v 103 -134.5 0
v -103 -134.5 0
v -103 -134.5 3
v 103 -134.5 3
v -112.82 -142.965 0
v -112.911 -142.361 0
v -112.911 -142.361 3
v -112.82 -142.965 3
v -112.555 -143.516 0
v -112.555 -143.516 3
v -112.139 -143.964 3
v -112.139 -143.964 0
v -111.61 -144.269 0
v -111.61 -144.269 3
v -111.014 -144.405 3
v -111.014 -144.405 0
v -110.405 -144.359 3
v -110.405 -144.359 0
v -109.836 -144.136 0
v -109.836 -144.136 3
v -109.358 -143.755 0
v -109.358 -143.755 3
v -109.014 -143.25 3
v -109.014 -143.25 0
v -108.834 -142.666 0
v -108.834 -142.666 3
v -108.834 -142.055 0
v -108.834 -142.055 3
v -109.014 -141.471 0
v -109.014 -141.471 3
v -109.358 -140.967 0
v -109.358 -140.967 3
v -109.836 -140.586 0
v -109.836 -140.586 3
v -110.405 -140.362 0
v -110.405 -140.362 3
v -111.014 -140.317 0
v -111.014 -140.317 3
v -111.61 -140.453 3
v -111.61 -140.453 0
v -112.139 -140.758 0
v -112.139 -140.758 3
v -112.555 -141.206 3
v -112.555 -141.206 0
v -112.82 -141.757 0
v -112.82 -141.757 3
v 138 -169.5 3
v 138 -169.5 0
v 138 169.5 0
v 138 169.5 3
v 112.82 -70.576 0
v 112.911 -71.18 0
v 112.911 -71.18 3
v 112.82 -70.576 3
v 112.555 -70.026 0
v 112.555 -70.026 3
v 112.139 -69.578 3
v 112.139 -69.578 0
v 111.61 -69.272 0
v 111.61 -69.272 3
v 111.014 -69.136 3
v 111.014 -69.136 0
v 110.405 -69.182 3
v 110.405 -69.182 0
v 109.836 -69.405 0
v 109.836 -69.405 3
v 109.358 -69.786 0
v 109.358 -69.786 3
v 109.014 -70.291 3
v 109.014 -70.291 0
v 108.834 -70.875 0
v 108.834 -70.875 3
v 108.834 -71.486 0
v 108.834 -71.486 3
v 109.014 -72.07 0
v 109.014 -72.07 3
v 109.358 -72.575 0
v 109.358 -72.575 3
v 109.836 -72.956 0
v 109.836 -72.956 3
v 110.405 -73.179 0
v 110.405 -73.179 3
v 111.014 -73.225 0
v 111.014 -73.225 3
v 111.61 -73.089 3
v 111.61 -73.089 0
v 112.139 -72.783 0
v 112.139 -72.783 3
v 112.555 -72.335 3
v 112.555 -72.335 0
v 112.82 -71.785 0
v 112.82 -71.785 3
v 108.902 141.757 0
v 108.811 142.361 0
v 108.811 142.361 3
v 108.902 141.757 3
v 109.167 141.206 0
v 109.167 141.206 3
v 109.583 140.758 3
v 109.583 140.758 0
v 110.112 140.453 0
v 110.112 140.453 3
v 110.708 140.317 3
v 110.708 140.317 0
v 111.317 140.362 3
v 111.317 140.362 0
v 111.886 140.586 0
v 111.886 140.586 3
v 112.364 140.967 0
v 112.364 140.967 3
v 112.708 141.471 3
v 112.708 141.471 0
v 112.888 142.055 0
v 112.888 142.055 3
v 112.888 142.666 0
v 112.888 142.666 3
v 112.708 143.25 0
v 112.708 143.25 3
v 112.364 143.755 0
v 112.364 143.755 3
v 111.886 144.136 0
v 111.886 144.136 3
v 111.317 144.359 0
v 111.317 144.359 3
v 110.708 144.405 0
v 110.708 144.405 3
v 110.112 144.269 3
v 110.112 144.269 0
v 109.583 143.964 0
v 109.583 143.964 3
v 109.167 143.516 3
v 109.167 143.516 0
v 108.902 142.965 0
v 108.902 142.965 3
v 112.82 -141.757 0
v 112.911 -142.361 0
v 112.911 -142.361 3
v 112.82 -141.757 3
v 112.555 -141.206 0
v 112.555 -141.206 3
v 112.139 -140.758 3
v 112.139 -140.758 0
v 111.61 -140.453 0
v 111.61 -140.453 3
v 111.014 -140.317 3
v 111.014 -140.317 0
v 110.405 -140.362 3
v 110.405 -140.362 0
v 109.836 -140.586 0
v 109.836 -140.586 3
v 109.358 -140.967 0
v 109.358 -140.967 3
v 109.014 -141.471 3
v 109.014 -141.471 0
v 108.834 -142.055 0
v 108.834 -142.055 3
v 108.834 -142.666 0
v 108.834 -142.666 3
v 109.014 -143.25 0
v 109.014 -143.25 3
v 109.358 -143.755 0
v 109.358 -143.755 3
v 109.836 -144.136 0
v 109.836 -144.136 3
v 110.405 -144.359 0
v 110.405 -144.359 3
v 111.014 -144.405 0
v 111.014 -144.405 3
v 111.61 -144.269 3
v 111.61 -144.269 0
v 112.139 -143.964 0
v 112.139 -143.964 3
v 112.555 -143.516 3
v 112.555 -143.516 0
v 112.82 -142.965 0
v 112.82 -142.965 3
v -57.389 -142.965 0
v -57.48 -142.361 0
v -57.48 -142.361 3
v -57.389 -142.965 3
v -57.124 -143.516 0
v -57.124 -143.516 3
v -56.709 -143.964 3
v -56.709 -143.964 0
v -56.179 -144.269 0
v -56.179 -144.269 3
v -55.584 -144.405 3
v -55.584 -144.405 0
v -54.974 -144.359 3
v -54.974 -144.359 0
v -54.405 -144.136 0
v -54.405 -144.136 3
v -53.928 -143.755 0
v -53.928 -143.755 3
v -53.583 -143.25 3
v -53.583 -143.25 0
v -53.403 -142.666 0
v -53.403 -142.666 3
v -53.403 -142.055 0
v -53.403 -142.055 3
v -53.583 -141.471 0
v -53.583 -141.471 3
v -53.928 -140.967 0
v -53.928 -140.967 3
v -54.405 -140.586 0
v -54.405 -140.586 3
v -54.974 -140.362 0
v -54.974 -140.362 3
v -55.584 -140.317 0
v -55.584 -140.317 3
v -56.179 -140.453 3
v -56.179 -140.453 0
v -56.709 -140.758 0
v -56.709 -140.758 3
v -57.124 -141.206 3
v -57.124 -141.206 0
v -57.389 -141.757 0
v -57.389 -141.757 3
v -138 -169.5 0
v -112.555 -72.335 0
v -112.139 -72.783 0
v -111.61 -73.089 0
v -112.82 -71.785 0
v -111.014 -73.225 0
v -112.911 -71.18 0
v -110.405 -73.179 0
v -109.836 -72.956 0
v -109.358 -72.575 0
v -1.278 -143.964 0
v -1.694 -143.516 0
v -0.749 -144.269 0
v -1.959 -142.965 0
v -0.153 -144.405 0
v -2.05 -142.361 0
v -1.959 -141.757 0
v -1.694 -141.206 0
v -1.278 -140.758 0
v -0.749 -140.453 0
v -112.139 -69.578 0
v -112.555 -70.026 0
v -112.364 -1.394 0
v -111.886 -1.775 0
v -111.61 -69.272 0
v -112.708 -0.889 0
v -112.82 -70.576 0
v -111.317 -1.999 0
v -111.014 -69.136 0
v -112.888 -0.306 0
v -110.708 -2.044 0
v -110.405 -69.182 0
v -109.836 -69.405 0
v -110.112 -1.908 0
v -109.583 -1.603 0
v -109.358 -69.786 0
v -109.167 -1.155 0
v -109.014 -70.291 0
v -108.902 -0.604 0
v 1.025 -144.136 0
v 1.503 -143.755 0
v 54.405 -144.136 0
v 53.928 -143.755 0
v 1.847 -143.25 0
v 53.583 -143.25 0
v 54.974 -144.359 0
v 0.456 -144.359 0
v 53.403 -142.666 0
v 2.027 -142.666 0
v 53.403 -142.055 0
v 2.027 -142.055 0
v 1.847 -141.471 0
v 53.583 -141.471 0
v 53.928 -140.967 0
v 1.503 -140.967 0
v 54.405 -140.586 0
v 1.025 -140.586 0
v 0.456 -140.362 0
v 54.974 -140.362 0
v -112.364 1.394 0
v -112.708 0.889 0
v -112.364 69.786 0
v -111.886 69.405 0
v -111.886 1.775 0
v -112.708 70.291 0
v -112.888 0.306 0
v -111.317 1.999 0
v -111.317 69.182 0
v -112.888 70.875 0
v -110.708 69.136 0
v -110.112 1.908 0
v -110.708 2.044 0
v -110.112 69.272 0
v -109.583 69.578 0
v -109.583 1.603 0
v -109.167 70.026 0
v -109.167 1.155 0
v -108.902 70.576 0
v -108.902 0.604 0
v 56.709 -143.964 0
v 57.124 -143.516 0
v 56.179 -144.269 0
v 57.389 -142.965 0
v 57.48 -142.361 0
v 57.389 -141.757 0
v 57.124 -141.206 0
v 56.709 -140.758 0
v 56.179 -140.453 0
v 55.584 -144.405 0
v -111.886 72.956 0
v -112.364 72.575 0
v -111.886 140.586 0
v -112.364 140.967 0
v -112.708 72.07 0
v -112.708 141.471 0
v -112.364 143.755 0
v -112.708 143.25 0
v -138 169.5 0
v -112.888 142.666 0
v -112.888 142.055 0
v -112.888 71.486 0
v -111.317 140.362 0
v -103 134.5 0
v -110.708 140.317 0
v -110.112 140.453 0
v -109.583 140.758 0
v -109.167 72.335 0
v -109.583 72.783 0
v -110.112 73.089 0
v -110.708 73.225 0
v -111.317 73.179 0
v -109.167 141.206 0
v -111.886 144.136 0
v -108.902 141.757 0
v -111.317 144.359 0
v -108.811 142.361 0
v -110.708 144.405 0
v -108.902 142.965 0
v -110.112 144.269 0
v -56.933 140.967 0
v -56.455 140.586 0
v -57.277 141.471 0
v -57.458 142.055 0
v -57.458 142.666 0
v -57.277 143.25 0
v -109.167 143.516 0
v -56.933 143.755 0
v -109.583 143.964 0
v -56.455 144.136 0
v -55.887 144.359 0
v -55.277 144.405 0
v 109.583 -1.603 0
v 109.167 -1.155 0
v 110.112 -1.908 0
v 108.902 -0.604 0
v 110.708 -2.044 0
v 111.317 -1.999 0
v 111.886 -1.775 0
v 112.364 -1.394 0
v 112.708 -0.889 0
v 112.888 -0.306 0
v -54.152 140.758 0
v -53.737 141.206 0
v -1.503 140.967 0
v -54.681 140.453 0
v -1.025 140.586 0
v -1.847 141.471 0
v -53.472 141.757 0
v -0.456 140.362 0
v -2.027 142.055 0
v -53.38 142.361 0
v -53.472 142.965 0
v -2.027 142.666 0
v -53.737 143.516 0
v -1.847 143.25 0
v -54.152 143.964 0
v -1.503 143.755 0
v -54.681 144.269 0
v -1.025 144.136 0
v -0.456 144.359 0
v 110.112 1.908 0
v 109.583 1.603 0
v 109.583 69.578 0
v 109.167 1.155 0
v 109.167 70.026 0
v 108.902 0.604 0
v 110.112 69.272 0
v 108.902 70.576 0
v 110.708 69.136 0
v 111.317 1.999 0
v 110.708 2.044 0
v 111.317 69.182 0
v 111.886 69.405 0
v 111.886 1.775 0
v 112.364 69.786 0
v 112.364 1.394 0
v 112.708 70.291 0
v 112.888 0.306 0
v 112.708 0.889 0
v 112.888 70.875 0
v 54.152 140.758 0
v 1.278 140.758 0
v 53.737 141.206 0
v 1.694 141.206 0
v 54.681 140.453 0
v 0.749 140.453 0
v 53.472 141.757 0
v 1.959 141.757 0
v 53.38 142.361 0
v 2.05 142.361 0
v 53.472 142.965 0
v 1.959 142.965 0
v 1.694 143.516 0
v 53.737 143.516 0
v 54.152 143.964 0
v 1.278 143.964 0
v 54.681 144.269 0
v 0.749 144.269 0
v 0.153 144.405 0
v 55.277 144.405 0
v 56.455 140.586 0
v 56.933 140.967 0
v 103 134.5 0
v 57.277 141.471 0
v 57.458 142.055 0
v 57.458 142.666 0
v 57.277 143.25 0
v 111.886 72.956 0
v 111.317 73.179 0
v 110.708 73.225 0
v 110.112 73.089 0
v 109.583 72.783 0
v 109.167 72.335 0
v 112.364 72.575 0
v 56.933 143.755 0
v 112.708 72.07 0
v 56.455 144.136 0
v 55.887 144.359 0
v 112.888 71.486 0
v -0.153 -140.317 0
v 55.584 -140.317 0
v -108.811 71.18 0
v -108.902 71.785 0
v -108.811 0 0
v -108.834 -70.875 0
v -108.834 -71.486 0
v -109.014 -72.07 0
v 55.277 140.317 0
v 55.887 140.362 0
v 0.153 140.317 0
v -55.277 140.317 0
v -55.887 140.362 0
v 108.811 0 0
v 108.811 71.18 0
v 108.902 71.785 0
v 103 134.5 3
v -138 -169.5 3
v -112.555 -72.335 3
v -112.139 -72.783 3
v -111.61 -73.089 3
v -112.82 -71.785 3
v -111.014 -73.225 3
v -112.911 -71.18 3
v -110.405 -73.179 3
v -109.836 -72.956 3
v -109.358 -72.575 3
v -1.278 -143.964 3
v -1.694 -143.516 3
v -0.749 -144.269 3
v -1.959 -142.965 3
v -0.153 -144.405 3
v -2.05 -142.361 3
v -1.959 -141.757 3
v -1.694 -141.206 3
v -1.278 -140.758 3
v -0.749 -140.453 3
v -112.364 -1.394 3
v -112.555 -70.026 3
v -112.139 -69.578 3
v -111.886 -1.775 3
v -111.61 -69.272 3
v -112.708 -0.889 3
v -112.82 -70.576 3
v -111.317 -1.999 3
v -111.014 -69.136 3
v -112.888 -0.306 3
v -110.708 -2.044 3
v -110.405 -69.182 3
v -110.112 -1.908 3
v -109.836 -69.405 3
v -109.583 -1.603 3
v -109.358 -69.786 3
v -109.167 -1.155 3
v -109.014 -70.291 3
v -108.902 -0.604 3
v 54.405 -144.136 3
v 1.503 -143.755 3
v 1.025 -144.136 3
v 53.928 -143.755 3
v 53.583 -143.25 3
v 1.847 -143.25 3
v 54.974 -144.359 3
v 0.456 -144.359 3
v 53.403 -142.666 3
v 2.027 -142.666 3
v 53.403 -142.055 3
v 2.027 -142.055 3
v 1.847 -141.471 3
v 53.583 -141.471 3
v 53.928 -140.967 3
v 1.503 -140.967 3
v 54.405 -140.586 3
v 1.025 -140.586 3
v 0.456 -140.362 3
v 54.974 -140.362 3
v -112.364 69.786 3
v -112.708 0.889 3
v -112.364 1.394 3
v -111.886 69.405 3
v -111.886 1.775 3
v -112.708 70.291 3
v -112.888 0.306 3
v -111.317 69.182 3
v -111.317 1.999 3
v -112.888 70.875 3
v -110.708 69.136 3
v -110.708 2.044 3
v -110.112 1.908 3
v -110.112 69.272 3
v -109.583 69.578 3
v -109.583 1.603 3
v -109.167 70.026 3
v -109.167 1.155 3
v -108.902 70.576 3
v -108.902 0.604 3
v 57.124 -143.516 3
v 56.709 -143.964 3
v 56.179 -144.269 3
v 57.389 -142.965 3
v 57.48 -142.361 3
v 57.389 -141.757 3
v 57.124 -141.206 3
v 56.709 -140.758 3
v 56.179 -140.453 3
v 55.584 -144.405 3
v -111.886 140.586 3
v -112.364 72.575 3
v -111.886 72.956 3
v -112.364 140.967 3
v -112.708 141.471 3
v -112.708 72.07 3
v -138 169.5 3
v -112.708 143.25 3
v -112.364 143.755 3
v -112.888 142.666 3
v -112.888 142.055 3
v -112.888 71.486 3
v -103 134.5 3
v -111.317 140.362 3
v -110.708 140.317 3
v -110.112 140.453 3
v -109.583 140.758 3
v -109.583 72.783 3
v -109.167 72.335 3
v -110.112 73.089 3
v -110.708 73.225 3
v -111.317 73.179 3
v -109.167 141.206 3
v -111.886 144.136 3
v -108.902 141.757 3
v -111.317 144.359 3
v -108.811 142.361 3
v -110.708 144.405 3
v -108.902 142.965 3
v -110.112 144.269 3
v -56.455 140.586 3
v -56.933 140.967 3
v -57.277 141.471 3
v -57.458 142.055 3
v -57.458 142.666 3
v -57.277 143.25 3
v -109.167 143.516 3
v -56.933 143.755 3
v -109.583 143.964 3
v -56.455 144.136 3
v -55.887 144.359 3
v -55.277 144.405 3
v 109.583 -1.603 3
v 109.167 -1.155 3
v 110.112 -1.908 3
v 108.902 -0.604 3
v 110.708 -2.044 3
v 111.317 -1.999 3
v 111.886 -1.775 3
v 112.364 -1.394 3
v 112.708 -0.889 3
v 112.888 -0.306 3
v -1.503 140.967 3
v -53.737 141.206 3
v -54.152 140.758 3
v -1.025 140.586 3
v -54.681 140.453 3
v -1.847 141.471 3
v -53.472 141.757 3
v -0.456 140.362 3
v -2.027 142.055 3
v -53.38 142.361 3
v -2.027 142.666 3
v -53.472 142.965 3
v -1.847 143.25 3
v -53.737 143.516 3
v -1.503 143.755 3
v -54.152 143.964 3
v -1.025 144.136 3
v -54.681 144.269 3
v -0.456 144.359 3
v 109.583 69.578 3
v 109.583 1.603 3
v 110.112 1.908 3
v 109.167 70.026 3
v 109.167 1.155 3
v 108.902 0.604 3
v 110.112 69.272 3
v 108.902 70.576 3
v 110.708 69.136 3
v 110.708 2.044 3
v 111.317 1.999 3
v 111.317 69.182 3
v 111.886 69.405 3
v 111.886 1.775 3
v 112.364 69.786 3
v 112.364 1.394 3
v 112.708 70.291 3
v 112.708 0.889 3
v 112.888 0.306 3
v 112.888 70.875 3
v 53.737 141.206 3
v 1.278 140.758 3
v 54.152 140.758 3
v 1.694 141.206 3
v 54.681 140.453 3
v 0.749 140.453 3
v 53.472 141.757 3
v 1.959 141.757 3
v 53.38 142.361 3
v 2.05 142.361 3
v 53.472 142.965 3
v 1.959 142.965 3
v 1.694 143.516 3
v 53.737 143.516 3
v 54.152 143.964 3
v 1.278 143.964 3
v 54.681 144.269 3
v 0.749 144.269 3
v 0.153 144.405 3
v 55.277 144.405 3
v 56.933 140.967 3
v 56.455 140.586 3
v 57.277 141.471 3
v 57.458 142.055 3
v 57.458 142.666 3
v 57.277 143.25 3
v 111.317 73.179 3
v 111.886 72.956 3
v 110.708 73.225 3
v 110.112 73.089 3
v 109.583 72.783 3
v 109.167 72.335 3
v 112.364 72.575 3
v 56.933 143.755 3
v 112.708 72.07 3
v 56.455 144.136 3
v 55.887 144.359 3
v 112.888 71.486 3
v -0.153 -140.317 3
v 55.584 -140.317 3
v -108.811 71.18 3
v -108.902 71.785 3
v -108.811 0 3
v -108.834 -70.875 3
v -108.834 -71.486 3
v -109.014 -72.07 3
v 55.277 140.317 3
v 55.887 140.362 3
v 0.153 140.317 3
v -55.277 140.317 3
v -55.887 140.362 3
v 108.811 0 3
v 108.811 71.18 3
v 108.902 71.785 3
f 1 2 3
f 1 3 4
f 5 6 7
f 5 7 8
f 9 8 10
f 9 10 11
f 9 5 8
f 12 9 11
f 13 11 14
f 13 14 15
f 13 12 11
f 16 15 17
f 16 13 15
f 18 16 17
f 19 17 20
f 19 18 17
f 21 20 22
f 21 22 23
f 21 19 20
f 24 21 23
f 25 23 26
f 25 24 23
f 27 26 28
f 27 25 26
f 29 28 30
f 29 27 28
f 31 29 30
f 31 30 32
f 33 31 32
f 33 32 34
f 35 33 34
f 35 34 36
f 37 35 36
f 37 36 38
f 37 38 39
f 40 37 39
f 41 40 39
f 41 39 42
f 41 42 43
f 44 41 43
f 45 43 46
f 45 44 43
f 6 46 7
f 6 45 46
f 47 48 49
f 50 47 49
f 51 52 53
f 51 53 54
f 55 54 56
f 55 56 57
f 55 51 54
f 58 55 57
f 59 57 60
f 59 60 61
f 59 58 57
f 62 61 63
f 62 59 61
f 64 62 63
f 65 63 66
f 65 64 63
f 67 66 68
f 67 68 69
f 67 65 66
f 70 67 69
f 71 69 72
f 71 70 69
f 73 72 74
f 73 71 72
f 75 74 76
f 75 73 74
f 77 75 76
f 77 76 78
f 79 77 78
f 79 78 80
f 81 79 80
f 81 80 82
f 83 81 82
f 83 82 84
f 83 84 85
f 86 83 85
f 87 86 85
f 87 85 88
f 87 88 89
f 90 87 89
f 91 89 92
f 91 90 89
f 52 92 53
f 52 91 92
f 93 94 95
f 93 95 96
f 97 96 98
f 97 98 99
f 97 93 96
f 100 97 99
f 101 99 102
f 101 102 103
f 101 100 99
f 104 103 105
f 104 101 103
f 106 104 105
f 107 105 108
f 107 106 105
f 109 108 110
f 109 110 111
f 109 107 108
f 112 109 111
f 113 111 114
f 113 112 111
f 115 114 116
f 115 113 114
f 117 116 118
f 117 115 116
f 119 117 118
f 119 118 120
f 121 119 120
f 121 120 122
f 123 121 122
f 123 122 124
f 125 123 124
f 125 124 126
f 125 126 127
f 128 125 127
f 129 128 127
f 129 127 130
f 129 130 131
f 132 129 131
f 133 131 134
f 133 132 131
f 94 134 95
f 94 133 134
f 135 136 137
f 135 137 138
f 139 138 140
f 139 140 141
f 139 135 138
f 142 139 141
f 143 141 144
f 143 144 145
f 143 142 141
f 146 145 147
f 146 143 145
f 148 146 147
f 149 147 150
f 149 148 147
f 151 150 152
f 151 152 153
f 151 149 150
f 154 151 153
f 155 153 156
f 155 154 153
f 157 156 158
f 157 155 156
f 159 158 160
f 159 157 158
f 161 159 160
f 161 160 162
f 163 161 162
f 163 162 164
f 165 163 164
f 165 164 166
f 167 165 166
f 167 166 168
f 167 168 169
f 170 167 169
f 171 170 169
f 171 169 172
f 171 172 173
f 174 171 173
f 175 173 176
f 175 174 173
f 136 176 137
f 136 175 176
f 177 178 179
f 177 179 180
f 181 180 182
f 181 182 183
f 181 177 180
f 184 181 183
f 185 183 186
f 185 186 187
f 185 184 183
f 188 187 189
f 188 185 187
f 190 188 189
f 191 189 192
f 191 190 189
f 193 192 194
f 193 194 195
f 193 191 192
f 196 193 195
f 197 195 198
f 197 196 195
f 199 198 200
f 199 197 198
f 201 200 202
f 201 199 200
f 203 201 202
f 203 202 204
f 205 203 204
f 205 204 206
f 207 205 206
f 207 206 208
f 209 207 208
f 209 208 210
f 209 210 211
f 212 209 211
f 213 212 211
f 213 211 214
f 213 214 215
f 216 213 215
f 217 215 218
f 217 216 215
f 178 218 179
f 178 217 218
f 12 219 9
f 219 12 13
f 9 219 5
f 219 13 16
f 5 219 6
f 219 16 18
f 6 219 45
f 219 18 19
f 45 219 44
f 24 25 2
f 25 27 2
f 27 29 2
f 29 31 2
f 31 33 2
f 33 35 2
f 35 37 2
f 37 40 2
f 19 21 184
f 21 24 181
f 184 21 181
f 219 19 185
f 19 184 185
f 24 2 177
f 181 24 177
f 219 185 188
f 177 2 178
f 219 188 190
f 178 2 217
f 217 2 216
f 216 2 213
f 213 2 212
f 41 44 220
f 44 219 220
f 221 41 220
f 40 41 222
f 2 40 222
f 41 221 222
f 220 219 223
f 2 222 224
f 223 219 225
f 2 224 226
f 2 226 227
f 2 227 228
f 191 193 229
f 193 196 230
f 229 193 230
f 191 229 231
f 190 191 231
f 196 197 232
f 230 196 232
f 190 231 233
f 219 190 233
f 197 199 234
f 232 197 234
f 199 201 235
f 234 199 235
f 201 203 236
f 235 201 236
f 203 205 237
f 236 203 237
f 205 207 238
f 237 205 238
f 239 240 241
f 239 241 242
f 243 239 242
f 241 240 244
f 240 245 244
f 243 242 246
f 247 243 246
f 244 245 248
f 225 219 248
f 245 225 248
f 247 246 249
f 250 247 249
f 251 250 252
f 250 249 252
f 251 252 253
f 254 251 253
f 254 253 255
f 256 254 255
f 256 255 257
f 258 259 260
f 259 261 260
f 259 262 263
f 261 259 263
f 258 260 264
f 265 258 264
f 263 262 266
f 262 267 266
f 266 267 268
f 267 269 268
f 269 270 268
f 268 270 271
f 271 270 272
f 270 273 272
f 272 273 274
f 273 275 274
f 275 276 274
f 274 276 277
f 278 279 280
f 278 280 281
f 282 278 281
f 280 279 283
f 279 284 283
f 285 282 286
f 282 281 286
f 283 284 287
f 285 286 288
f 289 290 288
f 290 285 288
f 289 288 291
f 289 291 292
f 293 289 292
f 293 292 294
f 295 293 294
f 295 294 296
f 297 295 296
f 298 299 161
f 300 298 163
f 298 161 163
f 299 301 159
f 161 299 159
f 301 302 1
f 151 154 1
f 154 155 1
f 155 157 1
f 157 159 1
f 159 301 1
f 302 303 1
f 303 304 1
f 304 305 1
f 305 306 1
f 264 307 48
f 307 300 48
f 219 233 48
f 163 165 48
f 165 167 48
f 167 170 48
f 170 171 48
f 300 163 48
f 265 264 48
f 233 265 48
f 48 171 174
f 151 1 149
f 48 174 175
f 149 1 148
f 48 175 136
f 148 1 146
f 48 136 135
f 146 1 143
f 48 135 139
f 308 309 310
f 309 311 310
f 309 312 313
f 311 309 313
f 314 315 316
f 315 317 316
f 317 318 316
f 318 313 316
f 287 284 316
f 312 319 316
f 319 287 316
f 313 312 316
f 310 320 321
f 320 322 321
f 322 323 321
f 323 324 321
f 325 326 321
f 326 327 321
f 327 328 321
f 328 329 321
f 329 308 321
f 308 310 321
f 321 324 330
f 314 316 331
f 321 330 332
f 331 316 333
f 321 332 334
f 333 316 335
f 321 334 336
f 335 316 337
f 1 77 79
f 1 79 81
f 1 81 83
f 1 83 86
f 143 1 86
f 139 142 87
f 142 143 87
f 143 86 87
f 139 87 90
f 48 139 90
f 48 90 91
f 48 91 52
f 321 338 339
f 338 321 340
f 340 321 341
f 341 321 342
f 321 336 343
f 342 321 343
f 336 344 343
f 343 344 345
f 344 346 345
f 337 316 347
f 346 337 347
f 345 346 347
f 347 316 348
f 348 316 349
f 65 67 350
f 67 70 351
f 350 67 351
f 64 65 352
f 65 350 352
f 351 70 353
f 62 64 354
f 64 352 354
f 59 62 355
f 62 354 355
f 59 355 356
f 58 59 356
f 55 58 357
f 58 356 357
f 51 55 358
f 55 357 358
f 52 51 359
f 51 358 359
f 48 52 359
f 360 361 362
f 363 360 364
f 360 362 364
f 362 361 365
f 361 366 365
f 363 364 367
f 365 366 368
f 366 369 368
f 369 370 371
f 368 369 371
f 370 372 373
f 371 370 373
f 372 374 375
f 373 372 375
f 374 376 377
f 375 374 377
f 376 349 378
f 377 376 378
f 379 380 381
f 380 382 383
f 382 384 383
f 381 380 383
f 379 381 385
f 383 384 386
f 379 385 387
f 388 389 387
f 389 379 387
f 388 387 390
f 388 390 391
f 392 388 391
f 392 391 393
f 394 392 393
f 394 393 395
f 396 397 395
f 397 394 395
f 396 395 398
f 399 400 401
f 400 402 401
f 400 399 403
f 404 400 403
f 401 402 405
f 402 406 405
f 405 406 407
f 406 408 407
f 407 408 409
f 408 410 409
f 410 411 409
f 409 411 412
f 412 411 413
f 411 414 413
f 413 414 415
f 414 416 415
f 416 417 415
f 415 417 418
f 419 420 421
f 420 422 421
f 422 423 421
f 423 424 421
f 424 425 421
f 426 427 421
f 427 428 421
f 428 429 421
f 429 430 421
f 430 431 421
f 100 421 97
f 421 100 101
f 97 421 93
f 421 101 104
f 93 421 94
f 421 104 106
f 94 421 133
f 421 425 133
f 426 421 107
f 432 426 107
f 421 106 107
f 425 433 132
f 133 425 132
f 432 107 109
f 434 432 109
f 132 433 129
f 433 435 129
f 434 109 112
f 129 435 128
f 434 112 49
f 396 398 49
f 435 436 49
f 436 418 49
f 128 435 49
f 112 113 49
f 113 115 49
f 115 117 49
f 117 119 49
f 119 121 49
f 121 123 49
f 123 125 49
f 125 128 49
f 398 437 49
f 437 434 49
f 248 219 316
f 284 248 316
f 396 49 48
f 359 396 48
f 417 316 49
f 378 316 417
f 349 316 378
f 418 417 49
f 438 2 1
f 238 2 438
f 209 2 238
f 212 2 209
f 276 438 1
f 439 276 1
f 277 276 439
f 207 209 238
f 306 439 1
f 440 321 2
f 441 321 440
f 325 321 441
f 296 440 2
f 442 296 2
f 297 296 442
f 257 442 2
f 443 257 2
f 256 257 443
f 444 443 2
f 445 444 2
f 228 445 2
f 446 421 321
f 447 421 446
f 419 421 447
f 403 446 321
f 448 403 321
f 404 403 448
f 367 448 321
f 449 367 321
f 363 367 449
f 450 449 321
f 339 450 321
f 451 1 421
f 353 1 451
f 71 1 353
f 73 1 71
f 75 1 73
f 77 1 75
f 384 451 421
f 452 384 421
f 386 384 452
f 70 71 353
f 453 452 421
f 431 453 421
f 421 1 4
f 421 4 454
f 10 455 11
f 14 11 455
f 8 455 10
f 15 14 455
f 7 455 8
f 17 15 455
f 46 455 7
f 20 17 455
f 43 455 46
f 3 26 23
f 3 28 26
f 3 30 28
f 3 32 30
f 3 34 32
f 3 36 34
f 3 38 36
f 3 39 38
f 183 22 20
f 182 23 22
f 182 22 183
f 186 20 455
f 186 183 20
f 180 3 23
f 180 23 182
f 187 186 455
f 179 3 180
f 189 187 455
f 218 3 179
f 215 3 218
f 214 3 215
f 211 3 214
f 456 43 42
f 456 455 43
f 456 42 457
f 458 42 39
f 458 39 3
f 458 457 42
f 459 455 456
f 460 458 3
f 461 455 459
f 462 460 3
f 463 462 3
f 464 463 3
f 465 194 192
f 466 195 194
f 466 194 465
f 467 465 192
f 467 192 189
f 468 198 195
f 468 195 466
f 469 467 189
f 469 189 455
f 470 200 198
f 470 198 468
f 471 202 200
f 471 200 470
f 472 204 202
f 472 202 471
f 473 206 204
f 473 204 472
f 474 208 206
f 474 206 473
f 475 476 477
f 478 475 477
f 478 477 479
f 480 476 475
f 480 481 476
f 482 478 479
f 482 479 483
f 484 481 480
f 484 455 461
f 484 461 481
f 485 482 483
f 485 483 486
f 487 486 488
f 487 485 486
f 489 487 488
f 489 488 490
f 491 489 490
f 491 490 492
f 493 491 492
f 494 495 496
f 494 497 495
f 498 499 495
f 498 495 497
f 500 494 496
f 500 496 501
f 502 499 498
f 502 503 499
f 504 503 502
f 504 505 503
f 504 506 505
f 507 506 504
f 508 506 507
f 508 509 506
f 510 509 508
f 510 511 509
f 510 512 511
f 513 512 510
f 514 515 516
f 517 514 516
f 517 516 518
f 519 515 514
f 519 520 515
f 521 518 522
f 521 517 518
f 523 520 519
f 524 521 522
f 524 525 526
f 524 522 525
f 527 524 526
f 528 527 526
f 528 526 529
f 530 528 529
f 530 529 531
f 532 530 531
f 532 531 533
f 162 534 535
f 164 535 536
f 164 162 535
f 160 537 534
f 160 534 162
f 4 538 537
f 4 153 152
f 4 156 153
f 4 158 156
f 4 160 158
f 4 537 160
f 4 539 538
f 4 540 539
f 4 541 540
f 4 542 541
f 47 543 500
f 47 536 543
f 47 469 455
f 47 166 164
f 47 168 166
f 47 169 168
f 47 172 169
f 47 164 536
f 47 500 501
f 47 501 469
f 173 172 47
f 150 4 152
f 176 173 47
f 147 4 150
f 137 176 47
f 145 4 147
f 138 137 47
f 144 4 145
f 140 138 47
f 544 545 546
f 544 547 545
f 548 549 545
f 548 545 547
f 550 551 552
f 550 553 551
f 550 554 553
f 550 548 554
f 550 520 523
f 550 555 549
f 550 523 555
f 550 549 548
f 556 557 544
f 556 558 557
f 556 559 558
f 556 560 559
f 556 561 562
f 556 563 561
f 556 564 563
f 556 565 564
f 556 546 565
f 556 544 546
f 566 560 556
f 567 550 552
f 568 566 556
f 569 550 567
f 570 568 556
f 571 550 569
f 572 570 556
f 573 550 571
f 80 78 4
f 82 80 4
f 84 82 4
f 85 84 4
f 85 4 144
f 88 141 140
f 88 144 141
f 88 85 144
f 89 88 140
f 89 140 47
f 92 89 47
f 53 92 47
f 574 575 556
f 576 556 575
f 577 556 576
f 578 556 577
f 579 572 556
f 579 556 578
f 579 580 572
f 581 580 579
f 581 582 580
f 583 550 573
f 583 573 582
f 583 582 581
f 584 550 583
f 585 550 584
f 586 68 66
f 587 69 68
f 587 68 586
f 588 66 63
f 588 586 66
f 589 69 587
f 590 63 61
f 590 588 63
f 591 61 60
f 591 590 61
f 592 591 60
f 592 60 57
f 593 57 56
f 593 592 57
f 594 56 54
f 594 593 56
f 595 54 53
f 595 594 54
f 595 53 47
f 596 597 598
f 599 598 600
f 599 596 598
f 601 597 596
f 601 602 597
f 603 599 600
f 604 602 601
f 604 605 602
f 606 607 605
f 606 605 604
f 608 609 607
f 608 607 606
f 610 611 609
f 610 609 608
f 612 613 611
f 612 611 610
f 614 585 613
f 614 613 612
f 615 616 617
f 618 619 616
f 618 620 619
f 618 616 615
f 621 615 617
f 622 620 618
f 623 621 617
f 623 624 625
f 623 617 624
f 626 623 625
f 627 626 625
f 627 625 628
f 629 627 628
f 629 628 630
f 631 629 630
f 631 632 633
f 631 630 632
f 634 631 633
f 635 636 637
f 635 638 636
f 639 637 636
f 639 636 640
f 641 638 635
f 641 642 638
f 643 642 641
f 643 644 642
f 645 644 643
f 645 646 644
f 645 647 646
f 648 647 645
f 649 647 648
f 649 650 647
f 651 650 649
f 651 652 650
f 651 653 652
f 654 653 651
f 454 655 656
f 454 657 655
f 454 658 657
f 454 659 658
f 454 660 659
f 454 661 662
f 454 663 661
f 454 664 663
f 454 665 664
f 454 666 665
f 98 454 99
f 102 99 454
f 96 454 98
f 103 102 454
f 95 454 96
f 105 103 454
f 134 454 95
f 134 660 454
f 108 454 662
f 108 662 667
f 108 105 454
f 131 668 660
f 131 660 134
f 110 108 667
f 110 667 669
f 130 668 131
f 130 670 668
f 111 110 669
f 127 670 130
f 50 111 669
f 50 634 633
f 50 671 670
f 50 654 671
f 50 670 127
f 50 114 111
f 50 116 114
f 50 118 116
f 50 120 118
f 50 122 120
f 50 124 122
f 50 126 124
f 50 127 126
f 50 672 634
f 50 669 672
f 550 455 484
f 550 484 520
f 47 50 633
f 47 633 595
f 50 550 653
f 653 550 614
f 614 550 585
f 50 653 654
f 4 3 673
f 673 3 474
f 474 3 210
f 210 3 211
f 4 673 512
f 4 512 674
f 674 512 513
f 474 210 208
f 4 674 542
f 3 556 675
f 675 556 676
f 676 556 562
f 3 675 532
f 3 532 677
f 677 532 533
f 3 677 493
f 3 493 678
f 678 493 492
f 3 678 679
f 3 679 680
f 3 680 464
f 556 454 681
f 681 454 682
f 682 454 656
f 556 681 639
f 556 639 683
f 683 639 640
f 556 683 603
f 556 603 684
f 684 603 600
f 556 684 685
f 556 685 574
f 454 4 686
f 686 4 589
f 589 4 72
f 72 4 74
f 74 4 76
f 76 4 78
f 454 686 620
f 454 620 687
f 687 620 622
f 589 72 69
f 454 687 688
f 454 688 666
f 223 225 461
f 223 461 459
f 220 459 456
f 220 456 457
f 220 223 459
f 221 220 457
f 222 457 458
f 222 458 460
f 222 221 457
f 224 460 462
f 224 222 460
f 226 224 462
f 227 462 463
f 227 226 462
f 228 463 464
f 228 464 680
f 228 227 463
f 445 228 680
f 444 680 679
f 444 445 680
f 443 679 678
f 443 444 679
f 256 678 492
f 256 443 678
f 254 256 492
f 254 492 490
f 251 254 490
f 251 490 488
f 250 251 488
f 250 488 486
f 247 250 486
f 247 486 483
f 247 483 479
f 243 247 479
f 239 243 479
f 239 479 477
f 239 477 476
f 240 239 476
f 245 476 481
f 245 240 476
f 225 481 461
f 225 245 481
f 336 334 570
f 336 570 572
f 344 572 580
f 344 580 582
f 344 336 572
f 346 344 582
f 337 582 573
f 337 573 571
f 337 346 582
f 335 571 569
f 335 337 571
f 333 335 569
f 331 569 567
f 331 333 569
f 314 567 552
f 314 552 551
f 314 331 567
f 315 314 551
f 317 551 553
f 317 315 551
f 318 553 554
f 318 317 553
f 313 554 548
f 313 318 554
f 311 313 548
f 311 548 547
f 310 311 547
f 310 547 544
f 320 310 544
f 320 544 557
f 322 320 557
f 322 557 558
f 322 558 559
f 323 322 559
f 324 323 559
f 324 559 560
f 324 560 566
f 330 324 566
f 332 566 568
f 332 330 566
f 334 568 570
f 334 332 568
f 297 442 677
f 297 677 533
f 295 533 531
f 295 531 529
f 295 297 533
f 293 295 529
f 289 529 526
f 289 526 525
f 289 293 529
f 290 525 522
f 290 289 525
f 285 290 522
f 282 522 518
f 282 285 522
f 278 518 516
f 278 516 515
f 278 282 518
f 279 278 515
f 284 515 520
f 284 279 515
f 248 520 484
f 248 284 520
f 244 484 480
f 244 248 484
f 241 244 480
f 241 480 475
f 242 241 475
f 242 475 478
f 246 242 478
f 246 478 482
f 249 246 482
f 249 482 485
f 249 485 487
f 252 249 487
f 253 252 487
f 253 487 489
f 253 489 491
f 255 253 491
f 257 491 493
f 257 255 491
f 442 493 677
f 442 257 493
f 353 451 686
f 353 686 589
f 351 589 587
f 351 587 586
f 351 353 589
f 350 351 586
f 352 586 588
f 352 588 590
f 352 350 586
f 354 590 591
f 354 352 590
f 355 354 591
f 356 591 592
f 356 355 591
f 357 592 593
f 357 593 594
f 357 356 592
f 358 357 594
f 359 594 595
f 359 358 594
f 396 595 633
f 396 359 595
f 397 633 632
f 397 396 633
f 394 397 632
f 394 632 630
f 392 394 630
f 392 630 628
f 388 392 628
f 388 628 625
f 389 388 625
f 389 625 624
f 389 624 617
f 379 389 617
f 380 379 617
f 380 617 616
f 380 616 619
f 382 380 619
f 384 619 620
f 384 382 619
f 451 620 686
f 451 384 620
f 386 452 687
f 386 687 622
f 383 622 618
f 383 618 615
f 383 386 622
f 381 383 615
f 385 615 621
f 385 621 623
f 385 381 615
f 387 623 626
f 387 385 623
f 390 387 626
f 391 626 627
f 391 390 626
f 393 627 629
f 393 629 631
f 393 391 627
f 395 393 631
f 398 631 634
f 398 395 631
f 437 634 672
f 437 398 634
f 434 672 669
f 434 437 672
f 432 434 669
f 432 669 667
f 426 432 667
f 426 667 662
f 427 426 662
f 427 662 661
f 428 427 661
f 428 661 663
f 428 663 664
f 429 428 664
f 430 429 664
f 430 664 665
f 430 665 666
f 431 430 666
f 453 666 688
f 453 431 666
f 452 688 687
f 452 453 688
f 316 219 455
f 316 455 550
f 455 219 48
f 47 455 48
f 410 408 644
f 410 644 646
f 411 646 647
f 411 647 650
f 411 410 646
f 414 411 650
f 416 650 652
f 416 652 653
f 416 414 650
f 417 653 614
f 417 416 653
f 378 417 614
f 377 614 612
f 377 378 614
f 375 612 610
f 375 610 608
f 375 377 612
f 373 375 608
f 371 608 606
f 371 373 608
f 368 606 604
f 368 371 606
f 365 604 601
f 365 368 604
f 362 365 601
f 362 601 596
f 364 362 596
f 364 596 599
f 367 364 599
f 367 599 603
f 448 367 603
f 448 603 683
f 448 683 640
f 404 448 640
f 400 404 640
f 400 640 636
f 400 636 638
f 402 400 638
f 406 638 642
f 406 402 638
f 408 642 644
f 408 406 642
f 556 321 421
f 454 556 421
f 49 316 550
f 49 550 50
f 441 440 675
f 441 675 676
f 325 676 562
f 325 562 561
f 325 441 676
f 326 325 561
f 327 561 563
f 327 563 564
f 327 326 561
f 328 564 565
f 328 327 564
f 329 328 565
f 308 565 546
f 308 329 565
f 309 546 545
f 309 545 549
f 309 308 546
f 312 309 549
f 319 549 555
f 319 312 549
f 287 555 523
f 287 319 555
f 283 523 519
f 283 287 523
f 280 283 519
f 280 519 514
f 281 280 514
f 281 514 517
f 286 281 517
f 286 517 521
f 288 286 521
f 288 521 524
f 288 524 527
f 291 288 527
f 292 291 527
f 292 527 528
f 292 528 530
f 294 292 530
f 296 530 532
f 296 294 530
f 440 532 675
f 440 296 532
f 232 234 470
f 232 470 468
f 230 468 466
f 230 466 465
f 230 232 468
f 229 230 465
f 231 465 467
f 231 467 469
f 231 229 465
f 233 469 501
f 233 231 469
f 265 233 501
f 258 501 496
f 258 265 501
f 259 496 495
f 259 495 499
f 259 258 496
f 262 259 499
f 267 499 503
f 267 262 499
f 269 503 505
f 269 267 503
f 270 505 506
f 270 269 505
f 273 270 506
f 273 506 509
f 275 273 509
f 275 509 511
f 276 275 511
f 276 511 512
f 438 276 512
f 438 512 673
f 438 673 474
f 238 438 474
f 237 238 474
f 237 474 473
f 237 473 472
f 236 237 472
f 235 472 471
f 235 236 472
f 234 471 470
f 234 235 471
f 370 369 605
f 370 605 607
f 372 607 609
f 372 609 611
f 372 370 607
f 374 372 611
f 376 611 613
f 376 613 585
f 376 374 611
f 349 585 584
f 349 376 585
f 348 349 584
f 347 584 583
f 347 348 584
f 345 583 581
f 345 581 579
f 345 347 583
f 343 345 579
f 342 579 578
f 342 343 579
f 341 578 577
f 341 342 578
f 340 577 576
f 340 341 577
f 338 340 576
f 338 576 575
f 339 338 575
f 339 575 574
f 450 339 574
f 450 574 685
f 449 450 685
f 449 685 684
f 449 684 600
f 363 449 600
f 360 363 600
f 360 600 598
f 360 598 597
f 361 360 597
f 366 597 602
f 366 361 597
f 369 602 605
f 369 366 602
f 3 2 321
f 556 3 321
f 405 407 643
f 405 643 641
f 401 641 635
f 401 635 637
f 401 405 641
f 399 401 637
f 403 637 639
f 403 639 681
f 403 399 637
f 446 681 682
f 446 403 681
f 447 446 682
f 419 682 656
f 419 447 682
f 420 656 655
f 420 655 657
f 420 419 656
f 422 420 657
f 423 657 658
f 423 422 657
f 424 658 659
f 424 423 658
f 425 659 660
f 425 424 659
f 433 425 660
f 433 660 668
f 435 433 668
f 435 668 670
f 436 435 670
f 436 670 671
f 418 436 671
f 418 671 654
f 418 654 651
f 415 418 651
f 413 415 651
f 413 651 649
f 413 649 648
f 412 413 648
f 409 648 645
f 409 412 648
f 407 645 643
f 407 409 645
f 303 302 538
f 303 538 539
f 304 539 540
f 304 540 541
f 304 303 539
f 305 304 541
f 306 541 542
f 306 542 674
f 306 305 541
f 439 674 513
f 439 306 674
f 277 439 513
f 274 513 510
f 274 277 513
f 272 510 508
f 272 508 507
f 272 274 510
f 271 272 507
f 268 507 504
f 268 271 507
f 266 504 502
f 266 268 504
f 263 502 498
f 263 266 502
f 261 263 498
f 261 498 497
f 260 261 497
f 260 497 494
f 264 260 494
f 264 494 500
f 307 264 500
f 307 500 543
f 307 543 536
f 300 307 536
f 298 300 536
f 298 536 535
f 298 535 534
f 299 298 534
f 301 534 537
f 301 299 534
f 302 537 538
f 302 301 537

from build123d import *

# Parameters (mm, degrees)
SKETCH1_W           = 276
SKETCH1_H           = 339
SKETCH1_R           = 2.05
SKETCH1_W_2         = 206
SKETCH1_H_2         = 269
BOSS_EXTRUDE1_DEPTH = 3


with BuildPart() as part:
    # Sketch1 → Boss-Extrude1 (new body)
    with BuildSketch(Plane.XY):
        Rectangle(SKETCH1_W, SKETCH1_H)
        with Locations((-110.860879207, 142.360879207)):
            Circle(SKETCH1_R, mode=Mode.SUBTRACT)
        with Locations((-55.430439603, 142.360879207)):
            Circle(SKETCH1_R, mode=Mode.SUBTRACT)
        with Locations((-110.860879207, 71.180439603)):
            Circle(SKETCH1_R, mode=Mode.SUBTRACT)
        with Locations(Location((-55.430439603, -142.360879207, 0), (0, 0, 180))):
            Circle(SKETCH1_R, mode=Mode.SUBTRACT)
        with Locations(Location((-110.860879207, -142.360879207, 0), (0, 0, 180))):
            Circle(SKETCH1_R, mode=Mode.SUBTRACT)
        with Locations(Location((-110.860879207, -71.180439603, 0), (0, 0, 180))):
            Circle(SKETCH1_R, mode=Mode.SUBTRACT)
        with Locations(Location((55.430439603, 142.360879207, 0), (0, 0, 180))):
            Circle(SKETCH1_R, mode=Mode.SUBTRACT)
        with Locations(Location((110.860879207, 142.360879207, 0), (0, 0, 180))):
            Circle(SKETCH1_R, mode=Mode.SUBTRACT)
        with Locations(Location((110.860879207, 71.180439603, 0), (0, 0, 180))):
            Circle(SKETCH1_R, mode=Mode.SUBTRACT)
        with Locations((55.430439603, -142.360879207)):
            Circle(SKETCH1_R, mode=Mode.SUBTRACT)
        with Locations((110.860879207, -142.360879207)):
            Circle(SKETCH1_R, mode=Mode.SUBTRACT)
        with Locations((110.860879207, -71.180439603)):
            Circle(SKETCH1_R, mode=Mode.SUBTRACT)
        with Locations((-110.860879207, 0)):
            Circle(SKETCH1_R, mode=Mode.SUBTRACT)
        with Locations(Location((110.860879207, 0, 0), (0, 0, 180))):
            Circle(SKETCH1_R, mode=Mode.SUBTRACT)
        with Locations((0, 142.360879207)):
            Circle(SKETCH1_R, mode=Mode.SUBTRACT)
        with Locations(Location((0, -142.360879207, 0), (0, 0, 180))):
            Circle(SKETCH1_R, mode=Mode.SUBTRACT)
        Rectangle(SKETCH1_W_2, SKETCH1_H_2, mode=Mode.SUBTRACT)
    extrude(amount=BOSS_EXTRUDE1_DEPTH)


solid = part.part
